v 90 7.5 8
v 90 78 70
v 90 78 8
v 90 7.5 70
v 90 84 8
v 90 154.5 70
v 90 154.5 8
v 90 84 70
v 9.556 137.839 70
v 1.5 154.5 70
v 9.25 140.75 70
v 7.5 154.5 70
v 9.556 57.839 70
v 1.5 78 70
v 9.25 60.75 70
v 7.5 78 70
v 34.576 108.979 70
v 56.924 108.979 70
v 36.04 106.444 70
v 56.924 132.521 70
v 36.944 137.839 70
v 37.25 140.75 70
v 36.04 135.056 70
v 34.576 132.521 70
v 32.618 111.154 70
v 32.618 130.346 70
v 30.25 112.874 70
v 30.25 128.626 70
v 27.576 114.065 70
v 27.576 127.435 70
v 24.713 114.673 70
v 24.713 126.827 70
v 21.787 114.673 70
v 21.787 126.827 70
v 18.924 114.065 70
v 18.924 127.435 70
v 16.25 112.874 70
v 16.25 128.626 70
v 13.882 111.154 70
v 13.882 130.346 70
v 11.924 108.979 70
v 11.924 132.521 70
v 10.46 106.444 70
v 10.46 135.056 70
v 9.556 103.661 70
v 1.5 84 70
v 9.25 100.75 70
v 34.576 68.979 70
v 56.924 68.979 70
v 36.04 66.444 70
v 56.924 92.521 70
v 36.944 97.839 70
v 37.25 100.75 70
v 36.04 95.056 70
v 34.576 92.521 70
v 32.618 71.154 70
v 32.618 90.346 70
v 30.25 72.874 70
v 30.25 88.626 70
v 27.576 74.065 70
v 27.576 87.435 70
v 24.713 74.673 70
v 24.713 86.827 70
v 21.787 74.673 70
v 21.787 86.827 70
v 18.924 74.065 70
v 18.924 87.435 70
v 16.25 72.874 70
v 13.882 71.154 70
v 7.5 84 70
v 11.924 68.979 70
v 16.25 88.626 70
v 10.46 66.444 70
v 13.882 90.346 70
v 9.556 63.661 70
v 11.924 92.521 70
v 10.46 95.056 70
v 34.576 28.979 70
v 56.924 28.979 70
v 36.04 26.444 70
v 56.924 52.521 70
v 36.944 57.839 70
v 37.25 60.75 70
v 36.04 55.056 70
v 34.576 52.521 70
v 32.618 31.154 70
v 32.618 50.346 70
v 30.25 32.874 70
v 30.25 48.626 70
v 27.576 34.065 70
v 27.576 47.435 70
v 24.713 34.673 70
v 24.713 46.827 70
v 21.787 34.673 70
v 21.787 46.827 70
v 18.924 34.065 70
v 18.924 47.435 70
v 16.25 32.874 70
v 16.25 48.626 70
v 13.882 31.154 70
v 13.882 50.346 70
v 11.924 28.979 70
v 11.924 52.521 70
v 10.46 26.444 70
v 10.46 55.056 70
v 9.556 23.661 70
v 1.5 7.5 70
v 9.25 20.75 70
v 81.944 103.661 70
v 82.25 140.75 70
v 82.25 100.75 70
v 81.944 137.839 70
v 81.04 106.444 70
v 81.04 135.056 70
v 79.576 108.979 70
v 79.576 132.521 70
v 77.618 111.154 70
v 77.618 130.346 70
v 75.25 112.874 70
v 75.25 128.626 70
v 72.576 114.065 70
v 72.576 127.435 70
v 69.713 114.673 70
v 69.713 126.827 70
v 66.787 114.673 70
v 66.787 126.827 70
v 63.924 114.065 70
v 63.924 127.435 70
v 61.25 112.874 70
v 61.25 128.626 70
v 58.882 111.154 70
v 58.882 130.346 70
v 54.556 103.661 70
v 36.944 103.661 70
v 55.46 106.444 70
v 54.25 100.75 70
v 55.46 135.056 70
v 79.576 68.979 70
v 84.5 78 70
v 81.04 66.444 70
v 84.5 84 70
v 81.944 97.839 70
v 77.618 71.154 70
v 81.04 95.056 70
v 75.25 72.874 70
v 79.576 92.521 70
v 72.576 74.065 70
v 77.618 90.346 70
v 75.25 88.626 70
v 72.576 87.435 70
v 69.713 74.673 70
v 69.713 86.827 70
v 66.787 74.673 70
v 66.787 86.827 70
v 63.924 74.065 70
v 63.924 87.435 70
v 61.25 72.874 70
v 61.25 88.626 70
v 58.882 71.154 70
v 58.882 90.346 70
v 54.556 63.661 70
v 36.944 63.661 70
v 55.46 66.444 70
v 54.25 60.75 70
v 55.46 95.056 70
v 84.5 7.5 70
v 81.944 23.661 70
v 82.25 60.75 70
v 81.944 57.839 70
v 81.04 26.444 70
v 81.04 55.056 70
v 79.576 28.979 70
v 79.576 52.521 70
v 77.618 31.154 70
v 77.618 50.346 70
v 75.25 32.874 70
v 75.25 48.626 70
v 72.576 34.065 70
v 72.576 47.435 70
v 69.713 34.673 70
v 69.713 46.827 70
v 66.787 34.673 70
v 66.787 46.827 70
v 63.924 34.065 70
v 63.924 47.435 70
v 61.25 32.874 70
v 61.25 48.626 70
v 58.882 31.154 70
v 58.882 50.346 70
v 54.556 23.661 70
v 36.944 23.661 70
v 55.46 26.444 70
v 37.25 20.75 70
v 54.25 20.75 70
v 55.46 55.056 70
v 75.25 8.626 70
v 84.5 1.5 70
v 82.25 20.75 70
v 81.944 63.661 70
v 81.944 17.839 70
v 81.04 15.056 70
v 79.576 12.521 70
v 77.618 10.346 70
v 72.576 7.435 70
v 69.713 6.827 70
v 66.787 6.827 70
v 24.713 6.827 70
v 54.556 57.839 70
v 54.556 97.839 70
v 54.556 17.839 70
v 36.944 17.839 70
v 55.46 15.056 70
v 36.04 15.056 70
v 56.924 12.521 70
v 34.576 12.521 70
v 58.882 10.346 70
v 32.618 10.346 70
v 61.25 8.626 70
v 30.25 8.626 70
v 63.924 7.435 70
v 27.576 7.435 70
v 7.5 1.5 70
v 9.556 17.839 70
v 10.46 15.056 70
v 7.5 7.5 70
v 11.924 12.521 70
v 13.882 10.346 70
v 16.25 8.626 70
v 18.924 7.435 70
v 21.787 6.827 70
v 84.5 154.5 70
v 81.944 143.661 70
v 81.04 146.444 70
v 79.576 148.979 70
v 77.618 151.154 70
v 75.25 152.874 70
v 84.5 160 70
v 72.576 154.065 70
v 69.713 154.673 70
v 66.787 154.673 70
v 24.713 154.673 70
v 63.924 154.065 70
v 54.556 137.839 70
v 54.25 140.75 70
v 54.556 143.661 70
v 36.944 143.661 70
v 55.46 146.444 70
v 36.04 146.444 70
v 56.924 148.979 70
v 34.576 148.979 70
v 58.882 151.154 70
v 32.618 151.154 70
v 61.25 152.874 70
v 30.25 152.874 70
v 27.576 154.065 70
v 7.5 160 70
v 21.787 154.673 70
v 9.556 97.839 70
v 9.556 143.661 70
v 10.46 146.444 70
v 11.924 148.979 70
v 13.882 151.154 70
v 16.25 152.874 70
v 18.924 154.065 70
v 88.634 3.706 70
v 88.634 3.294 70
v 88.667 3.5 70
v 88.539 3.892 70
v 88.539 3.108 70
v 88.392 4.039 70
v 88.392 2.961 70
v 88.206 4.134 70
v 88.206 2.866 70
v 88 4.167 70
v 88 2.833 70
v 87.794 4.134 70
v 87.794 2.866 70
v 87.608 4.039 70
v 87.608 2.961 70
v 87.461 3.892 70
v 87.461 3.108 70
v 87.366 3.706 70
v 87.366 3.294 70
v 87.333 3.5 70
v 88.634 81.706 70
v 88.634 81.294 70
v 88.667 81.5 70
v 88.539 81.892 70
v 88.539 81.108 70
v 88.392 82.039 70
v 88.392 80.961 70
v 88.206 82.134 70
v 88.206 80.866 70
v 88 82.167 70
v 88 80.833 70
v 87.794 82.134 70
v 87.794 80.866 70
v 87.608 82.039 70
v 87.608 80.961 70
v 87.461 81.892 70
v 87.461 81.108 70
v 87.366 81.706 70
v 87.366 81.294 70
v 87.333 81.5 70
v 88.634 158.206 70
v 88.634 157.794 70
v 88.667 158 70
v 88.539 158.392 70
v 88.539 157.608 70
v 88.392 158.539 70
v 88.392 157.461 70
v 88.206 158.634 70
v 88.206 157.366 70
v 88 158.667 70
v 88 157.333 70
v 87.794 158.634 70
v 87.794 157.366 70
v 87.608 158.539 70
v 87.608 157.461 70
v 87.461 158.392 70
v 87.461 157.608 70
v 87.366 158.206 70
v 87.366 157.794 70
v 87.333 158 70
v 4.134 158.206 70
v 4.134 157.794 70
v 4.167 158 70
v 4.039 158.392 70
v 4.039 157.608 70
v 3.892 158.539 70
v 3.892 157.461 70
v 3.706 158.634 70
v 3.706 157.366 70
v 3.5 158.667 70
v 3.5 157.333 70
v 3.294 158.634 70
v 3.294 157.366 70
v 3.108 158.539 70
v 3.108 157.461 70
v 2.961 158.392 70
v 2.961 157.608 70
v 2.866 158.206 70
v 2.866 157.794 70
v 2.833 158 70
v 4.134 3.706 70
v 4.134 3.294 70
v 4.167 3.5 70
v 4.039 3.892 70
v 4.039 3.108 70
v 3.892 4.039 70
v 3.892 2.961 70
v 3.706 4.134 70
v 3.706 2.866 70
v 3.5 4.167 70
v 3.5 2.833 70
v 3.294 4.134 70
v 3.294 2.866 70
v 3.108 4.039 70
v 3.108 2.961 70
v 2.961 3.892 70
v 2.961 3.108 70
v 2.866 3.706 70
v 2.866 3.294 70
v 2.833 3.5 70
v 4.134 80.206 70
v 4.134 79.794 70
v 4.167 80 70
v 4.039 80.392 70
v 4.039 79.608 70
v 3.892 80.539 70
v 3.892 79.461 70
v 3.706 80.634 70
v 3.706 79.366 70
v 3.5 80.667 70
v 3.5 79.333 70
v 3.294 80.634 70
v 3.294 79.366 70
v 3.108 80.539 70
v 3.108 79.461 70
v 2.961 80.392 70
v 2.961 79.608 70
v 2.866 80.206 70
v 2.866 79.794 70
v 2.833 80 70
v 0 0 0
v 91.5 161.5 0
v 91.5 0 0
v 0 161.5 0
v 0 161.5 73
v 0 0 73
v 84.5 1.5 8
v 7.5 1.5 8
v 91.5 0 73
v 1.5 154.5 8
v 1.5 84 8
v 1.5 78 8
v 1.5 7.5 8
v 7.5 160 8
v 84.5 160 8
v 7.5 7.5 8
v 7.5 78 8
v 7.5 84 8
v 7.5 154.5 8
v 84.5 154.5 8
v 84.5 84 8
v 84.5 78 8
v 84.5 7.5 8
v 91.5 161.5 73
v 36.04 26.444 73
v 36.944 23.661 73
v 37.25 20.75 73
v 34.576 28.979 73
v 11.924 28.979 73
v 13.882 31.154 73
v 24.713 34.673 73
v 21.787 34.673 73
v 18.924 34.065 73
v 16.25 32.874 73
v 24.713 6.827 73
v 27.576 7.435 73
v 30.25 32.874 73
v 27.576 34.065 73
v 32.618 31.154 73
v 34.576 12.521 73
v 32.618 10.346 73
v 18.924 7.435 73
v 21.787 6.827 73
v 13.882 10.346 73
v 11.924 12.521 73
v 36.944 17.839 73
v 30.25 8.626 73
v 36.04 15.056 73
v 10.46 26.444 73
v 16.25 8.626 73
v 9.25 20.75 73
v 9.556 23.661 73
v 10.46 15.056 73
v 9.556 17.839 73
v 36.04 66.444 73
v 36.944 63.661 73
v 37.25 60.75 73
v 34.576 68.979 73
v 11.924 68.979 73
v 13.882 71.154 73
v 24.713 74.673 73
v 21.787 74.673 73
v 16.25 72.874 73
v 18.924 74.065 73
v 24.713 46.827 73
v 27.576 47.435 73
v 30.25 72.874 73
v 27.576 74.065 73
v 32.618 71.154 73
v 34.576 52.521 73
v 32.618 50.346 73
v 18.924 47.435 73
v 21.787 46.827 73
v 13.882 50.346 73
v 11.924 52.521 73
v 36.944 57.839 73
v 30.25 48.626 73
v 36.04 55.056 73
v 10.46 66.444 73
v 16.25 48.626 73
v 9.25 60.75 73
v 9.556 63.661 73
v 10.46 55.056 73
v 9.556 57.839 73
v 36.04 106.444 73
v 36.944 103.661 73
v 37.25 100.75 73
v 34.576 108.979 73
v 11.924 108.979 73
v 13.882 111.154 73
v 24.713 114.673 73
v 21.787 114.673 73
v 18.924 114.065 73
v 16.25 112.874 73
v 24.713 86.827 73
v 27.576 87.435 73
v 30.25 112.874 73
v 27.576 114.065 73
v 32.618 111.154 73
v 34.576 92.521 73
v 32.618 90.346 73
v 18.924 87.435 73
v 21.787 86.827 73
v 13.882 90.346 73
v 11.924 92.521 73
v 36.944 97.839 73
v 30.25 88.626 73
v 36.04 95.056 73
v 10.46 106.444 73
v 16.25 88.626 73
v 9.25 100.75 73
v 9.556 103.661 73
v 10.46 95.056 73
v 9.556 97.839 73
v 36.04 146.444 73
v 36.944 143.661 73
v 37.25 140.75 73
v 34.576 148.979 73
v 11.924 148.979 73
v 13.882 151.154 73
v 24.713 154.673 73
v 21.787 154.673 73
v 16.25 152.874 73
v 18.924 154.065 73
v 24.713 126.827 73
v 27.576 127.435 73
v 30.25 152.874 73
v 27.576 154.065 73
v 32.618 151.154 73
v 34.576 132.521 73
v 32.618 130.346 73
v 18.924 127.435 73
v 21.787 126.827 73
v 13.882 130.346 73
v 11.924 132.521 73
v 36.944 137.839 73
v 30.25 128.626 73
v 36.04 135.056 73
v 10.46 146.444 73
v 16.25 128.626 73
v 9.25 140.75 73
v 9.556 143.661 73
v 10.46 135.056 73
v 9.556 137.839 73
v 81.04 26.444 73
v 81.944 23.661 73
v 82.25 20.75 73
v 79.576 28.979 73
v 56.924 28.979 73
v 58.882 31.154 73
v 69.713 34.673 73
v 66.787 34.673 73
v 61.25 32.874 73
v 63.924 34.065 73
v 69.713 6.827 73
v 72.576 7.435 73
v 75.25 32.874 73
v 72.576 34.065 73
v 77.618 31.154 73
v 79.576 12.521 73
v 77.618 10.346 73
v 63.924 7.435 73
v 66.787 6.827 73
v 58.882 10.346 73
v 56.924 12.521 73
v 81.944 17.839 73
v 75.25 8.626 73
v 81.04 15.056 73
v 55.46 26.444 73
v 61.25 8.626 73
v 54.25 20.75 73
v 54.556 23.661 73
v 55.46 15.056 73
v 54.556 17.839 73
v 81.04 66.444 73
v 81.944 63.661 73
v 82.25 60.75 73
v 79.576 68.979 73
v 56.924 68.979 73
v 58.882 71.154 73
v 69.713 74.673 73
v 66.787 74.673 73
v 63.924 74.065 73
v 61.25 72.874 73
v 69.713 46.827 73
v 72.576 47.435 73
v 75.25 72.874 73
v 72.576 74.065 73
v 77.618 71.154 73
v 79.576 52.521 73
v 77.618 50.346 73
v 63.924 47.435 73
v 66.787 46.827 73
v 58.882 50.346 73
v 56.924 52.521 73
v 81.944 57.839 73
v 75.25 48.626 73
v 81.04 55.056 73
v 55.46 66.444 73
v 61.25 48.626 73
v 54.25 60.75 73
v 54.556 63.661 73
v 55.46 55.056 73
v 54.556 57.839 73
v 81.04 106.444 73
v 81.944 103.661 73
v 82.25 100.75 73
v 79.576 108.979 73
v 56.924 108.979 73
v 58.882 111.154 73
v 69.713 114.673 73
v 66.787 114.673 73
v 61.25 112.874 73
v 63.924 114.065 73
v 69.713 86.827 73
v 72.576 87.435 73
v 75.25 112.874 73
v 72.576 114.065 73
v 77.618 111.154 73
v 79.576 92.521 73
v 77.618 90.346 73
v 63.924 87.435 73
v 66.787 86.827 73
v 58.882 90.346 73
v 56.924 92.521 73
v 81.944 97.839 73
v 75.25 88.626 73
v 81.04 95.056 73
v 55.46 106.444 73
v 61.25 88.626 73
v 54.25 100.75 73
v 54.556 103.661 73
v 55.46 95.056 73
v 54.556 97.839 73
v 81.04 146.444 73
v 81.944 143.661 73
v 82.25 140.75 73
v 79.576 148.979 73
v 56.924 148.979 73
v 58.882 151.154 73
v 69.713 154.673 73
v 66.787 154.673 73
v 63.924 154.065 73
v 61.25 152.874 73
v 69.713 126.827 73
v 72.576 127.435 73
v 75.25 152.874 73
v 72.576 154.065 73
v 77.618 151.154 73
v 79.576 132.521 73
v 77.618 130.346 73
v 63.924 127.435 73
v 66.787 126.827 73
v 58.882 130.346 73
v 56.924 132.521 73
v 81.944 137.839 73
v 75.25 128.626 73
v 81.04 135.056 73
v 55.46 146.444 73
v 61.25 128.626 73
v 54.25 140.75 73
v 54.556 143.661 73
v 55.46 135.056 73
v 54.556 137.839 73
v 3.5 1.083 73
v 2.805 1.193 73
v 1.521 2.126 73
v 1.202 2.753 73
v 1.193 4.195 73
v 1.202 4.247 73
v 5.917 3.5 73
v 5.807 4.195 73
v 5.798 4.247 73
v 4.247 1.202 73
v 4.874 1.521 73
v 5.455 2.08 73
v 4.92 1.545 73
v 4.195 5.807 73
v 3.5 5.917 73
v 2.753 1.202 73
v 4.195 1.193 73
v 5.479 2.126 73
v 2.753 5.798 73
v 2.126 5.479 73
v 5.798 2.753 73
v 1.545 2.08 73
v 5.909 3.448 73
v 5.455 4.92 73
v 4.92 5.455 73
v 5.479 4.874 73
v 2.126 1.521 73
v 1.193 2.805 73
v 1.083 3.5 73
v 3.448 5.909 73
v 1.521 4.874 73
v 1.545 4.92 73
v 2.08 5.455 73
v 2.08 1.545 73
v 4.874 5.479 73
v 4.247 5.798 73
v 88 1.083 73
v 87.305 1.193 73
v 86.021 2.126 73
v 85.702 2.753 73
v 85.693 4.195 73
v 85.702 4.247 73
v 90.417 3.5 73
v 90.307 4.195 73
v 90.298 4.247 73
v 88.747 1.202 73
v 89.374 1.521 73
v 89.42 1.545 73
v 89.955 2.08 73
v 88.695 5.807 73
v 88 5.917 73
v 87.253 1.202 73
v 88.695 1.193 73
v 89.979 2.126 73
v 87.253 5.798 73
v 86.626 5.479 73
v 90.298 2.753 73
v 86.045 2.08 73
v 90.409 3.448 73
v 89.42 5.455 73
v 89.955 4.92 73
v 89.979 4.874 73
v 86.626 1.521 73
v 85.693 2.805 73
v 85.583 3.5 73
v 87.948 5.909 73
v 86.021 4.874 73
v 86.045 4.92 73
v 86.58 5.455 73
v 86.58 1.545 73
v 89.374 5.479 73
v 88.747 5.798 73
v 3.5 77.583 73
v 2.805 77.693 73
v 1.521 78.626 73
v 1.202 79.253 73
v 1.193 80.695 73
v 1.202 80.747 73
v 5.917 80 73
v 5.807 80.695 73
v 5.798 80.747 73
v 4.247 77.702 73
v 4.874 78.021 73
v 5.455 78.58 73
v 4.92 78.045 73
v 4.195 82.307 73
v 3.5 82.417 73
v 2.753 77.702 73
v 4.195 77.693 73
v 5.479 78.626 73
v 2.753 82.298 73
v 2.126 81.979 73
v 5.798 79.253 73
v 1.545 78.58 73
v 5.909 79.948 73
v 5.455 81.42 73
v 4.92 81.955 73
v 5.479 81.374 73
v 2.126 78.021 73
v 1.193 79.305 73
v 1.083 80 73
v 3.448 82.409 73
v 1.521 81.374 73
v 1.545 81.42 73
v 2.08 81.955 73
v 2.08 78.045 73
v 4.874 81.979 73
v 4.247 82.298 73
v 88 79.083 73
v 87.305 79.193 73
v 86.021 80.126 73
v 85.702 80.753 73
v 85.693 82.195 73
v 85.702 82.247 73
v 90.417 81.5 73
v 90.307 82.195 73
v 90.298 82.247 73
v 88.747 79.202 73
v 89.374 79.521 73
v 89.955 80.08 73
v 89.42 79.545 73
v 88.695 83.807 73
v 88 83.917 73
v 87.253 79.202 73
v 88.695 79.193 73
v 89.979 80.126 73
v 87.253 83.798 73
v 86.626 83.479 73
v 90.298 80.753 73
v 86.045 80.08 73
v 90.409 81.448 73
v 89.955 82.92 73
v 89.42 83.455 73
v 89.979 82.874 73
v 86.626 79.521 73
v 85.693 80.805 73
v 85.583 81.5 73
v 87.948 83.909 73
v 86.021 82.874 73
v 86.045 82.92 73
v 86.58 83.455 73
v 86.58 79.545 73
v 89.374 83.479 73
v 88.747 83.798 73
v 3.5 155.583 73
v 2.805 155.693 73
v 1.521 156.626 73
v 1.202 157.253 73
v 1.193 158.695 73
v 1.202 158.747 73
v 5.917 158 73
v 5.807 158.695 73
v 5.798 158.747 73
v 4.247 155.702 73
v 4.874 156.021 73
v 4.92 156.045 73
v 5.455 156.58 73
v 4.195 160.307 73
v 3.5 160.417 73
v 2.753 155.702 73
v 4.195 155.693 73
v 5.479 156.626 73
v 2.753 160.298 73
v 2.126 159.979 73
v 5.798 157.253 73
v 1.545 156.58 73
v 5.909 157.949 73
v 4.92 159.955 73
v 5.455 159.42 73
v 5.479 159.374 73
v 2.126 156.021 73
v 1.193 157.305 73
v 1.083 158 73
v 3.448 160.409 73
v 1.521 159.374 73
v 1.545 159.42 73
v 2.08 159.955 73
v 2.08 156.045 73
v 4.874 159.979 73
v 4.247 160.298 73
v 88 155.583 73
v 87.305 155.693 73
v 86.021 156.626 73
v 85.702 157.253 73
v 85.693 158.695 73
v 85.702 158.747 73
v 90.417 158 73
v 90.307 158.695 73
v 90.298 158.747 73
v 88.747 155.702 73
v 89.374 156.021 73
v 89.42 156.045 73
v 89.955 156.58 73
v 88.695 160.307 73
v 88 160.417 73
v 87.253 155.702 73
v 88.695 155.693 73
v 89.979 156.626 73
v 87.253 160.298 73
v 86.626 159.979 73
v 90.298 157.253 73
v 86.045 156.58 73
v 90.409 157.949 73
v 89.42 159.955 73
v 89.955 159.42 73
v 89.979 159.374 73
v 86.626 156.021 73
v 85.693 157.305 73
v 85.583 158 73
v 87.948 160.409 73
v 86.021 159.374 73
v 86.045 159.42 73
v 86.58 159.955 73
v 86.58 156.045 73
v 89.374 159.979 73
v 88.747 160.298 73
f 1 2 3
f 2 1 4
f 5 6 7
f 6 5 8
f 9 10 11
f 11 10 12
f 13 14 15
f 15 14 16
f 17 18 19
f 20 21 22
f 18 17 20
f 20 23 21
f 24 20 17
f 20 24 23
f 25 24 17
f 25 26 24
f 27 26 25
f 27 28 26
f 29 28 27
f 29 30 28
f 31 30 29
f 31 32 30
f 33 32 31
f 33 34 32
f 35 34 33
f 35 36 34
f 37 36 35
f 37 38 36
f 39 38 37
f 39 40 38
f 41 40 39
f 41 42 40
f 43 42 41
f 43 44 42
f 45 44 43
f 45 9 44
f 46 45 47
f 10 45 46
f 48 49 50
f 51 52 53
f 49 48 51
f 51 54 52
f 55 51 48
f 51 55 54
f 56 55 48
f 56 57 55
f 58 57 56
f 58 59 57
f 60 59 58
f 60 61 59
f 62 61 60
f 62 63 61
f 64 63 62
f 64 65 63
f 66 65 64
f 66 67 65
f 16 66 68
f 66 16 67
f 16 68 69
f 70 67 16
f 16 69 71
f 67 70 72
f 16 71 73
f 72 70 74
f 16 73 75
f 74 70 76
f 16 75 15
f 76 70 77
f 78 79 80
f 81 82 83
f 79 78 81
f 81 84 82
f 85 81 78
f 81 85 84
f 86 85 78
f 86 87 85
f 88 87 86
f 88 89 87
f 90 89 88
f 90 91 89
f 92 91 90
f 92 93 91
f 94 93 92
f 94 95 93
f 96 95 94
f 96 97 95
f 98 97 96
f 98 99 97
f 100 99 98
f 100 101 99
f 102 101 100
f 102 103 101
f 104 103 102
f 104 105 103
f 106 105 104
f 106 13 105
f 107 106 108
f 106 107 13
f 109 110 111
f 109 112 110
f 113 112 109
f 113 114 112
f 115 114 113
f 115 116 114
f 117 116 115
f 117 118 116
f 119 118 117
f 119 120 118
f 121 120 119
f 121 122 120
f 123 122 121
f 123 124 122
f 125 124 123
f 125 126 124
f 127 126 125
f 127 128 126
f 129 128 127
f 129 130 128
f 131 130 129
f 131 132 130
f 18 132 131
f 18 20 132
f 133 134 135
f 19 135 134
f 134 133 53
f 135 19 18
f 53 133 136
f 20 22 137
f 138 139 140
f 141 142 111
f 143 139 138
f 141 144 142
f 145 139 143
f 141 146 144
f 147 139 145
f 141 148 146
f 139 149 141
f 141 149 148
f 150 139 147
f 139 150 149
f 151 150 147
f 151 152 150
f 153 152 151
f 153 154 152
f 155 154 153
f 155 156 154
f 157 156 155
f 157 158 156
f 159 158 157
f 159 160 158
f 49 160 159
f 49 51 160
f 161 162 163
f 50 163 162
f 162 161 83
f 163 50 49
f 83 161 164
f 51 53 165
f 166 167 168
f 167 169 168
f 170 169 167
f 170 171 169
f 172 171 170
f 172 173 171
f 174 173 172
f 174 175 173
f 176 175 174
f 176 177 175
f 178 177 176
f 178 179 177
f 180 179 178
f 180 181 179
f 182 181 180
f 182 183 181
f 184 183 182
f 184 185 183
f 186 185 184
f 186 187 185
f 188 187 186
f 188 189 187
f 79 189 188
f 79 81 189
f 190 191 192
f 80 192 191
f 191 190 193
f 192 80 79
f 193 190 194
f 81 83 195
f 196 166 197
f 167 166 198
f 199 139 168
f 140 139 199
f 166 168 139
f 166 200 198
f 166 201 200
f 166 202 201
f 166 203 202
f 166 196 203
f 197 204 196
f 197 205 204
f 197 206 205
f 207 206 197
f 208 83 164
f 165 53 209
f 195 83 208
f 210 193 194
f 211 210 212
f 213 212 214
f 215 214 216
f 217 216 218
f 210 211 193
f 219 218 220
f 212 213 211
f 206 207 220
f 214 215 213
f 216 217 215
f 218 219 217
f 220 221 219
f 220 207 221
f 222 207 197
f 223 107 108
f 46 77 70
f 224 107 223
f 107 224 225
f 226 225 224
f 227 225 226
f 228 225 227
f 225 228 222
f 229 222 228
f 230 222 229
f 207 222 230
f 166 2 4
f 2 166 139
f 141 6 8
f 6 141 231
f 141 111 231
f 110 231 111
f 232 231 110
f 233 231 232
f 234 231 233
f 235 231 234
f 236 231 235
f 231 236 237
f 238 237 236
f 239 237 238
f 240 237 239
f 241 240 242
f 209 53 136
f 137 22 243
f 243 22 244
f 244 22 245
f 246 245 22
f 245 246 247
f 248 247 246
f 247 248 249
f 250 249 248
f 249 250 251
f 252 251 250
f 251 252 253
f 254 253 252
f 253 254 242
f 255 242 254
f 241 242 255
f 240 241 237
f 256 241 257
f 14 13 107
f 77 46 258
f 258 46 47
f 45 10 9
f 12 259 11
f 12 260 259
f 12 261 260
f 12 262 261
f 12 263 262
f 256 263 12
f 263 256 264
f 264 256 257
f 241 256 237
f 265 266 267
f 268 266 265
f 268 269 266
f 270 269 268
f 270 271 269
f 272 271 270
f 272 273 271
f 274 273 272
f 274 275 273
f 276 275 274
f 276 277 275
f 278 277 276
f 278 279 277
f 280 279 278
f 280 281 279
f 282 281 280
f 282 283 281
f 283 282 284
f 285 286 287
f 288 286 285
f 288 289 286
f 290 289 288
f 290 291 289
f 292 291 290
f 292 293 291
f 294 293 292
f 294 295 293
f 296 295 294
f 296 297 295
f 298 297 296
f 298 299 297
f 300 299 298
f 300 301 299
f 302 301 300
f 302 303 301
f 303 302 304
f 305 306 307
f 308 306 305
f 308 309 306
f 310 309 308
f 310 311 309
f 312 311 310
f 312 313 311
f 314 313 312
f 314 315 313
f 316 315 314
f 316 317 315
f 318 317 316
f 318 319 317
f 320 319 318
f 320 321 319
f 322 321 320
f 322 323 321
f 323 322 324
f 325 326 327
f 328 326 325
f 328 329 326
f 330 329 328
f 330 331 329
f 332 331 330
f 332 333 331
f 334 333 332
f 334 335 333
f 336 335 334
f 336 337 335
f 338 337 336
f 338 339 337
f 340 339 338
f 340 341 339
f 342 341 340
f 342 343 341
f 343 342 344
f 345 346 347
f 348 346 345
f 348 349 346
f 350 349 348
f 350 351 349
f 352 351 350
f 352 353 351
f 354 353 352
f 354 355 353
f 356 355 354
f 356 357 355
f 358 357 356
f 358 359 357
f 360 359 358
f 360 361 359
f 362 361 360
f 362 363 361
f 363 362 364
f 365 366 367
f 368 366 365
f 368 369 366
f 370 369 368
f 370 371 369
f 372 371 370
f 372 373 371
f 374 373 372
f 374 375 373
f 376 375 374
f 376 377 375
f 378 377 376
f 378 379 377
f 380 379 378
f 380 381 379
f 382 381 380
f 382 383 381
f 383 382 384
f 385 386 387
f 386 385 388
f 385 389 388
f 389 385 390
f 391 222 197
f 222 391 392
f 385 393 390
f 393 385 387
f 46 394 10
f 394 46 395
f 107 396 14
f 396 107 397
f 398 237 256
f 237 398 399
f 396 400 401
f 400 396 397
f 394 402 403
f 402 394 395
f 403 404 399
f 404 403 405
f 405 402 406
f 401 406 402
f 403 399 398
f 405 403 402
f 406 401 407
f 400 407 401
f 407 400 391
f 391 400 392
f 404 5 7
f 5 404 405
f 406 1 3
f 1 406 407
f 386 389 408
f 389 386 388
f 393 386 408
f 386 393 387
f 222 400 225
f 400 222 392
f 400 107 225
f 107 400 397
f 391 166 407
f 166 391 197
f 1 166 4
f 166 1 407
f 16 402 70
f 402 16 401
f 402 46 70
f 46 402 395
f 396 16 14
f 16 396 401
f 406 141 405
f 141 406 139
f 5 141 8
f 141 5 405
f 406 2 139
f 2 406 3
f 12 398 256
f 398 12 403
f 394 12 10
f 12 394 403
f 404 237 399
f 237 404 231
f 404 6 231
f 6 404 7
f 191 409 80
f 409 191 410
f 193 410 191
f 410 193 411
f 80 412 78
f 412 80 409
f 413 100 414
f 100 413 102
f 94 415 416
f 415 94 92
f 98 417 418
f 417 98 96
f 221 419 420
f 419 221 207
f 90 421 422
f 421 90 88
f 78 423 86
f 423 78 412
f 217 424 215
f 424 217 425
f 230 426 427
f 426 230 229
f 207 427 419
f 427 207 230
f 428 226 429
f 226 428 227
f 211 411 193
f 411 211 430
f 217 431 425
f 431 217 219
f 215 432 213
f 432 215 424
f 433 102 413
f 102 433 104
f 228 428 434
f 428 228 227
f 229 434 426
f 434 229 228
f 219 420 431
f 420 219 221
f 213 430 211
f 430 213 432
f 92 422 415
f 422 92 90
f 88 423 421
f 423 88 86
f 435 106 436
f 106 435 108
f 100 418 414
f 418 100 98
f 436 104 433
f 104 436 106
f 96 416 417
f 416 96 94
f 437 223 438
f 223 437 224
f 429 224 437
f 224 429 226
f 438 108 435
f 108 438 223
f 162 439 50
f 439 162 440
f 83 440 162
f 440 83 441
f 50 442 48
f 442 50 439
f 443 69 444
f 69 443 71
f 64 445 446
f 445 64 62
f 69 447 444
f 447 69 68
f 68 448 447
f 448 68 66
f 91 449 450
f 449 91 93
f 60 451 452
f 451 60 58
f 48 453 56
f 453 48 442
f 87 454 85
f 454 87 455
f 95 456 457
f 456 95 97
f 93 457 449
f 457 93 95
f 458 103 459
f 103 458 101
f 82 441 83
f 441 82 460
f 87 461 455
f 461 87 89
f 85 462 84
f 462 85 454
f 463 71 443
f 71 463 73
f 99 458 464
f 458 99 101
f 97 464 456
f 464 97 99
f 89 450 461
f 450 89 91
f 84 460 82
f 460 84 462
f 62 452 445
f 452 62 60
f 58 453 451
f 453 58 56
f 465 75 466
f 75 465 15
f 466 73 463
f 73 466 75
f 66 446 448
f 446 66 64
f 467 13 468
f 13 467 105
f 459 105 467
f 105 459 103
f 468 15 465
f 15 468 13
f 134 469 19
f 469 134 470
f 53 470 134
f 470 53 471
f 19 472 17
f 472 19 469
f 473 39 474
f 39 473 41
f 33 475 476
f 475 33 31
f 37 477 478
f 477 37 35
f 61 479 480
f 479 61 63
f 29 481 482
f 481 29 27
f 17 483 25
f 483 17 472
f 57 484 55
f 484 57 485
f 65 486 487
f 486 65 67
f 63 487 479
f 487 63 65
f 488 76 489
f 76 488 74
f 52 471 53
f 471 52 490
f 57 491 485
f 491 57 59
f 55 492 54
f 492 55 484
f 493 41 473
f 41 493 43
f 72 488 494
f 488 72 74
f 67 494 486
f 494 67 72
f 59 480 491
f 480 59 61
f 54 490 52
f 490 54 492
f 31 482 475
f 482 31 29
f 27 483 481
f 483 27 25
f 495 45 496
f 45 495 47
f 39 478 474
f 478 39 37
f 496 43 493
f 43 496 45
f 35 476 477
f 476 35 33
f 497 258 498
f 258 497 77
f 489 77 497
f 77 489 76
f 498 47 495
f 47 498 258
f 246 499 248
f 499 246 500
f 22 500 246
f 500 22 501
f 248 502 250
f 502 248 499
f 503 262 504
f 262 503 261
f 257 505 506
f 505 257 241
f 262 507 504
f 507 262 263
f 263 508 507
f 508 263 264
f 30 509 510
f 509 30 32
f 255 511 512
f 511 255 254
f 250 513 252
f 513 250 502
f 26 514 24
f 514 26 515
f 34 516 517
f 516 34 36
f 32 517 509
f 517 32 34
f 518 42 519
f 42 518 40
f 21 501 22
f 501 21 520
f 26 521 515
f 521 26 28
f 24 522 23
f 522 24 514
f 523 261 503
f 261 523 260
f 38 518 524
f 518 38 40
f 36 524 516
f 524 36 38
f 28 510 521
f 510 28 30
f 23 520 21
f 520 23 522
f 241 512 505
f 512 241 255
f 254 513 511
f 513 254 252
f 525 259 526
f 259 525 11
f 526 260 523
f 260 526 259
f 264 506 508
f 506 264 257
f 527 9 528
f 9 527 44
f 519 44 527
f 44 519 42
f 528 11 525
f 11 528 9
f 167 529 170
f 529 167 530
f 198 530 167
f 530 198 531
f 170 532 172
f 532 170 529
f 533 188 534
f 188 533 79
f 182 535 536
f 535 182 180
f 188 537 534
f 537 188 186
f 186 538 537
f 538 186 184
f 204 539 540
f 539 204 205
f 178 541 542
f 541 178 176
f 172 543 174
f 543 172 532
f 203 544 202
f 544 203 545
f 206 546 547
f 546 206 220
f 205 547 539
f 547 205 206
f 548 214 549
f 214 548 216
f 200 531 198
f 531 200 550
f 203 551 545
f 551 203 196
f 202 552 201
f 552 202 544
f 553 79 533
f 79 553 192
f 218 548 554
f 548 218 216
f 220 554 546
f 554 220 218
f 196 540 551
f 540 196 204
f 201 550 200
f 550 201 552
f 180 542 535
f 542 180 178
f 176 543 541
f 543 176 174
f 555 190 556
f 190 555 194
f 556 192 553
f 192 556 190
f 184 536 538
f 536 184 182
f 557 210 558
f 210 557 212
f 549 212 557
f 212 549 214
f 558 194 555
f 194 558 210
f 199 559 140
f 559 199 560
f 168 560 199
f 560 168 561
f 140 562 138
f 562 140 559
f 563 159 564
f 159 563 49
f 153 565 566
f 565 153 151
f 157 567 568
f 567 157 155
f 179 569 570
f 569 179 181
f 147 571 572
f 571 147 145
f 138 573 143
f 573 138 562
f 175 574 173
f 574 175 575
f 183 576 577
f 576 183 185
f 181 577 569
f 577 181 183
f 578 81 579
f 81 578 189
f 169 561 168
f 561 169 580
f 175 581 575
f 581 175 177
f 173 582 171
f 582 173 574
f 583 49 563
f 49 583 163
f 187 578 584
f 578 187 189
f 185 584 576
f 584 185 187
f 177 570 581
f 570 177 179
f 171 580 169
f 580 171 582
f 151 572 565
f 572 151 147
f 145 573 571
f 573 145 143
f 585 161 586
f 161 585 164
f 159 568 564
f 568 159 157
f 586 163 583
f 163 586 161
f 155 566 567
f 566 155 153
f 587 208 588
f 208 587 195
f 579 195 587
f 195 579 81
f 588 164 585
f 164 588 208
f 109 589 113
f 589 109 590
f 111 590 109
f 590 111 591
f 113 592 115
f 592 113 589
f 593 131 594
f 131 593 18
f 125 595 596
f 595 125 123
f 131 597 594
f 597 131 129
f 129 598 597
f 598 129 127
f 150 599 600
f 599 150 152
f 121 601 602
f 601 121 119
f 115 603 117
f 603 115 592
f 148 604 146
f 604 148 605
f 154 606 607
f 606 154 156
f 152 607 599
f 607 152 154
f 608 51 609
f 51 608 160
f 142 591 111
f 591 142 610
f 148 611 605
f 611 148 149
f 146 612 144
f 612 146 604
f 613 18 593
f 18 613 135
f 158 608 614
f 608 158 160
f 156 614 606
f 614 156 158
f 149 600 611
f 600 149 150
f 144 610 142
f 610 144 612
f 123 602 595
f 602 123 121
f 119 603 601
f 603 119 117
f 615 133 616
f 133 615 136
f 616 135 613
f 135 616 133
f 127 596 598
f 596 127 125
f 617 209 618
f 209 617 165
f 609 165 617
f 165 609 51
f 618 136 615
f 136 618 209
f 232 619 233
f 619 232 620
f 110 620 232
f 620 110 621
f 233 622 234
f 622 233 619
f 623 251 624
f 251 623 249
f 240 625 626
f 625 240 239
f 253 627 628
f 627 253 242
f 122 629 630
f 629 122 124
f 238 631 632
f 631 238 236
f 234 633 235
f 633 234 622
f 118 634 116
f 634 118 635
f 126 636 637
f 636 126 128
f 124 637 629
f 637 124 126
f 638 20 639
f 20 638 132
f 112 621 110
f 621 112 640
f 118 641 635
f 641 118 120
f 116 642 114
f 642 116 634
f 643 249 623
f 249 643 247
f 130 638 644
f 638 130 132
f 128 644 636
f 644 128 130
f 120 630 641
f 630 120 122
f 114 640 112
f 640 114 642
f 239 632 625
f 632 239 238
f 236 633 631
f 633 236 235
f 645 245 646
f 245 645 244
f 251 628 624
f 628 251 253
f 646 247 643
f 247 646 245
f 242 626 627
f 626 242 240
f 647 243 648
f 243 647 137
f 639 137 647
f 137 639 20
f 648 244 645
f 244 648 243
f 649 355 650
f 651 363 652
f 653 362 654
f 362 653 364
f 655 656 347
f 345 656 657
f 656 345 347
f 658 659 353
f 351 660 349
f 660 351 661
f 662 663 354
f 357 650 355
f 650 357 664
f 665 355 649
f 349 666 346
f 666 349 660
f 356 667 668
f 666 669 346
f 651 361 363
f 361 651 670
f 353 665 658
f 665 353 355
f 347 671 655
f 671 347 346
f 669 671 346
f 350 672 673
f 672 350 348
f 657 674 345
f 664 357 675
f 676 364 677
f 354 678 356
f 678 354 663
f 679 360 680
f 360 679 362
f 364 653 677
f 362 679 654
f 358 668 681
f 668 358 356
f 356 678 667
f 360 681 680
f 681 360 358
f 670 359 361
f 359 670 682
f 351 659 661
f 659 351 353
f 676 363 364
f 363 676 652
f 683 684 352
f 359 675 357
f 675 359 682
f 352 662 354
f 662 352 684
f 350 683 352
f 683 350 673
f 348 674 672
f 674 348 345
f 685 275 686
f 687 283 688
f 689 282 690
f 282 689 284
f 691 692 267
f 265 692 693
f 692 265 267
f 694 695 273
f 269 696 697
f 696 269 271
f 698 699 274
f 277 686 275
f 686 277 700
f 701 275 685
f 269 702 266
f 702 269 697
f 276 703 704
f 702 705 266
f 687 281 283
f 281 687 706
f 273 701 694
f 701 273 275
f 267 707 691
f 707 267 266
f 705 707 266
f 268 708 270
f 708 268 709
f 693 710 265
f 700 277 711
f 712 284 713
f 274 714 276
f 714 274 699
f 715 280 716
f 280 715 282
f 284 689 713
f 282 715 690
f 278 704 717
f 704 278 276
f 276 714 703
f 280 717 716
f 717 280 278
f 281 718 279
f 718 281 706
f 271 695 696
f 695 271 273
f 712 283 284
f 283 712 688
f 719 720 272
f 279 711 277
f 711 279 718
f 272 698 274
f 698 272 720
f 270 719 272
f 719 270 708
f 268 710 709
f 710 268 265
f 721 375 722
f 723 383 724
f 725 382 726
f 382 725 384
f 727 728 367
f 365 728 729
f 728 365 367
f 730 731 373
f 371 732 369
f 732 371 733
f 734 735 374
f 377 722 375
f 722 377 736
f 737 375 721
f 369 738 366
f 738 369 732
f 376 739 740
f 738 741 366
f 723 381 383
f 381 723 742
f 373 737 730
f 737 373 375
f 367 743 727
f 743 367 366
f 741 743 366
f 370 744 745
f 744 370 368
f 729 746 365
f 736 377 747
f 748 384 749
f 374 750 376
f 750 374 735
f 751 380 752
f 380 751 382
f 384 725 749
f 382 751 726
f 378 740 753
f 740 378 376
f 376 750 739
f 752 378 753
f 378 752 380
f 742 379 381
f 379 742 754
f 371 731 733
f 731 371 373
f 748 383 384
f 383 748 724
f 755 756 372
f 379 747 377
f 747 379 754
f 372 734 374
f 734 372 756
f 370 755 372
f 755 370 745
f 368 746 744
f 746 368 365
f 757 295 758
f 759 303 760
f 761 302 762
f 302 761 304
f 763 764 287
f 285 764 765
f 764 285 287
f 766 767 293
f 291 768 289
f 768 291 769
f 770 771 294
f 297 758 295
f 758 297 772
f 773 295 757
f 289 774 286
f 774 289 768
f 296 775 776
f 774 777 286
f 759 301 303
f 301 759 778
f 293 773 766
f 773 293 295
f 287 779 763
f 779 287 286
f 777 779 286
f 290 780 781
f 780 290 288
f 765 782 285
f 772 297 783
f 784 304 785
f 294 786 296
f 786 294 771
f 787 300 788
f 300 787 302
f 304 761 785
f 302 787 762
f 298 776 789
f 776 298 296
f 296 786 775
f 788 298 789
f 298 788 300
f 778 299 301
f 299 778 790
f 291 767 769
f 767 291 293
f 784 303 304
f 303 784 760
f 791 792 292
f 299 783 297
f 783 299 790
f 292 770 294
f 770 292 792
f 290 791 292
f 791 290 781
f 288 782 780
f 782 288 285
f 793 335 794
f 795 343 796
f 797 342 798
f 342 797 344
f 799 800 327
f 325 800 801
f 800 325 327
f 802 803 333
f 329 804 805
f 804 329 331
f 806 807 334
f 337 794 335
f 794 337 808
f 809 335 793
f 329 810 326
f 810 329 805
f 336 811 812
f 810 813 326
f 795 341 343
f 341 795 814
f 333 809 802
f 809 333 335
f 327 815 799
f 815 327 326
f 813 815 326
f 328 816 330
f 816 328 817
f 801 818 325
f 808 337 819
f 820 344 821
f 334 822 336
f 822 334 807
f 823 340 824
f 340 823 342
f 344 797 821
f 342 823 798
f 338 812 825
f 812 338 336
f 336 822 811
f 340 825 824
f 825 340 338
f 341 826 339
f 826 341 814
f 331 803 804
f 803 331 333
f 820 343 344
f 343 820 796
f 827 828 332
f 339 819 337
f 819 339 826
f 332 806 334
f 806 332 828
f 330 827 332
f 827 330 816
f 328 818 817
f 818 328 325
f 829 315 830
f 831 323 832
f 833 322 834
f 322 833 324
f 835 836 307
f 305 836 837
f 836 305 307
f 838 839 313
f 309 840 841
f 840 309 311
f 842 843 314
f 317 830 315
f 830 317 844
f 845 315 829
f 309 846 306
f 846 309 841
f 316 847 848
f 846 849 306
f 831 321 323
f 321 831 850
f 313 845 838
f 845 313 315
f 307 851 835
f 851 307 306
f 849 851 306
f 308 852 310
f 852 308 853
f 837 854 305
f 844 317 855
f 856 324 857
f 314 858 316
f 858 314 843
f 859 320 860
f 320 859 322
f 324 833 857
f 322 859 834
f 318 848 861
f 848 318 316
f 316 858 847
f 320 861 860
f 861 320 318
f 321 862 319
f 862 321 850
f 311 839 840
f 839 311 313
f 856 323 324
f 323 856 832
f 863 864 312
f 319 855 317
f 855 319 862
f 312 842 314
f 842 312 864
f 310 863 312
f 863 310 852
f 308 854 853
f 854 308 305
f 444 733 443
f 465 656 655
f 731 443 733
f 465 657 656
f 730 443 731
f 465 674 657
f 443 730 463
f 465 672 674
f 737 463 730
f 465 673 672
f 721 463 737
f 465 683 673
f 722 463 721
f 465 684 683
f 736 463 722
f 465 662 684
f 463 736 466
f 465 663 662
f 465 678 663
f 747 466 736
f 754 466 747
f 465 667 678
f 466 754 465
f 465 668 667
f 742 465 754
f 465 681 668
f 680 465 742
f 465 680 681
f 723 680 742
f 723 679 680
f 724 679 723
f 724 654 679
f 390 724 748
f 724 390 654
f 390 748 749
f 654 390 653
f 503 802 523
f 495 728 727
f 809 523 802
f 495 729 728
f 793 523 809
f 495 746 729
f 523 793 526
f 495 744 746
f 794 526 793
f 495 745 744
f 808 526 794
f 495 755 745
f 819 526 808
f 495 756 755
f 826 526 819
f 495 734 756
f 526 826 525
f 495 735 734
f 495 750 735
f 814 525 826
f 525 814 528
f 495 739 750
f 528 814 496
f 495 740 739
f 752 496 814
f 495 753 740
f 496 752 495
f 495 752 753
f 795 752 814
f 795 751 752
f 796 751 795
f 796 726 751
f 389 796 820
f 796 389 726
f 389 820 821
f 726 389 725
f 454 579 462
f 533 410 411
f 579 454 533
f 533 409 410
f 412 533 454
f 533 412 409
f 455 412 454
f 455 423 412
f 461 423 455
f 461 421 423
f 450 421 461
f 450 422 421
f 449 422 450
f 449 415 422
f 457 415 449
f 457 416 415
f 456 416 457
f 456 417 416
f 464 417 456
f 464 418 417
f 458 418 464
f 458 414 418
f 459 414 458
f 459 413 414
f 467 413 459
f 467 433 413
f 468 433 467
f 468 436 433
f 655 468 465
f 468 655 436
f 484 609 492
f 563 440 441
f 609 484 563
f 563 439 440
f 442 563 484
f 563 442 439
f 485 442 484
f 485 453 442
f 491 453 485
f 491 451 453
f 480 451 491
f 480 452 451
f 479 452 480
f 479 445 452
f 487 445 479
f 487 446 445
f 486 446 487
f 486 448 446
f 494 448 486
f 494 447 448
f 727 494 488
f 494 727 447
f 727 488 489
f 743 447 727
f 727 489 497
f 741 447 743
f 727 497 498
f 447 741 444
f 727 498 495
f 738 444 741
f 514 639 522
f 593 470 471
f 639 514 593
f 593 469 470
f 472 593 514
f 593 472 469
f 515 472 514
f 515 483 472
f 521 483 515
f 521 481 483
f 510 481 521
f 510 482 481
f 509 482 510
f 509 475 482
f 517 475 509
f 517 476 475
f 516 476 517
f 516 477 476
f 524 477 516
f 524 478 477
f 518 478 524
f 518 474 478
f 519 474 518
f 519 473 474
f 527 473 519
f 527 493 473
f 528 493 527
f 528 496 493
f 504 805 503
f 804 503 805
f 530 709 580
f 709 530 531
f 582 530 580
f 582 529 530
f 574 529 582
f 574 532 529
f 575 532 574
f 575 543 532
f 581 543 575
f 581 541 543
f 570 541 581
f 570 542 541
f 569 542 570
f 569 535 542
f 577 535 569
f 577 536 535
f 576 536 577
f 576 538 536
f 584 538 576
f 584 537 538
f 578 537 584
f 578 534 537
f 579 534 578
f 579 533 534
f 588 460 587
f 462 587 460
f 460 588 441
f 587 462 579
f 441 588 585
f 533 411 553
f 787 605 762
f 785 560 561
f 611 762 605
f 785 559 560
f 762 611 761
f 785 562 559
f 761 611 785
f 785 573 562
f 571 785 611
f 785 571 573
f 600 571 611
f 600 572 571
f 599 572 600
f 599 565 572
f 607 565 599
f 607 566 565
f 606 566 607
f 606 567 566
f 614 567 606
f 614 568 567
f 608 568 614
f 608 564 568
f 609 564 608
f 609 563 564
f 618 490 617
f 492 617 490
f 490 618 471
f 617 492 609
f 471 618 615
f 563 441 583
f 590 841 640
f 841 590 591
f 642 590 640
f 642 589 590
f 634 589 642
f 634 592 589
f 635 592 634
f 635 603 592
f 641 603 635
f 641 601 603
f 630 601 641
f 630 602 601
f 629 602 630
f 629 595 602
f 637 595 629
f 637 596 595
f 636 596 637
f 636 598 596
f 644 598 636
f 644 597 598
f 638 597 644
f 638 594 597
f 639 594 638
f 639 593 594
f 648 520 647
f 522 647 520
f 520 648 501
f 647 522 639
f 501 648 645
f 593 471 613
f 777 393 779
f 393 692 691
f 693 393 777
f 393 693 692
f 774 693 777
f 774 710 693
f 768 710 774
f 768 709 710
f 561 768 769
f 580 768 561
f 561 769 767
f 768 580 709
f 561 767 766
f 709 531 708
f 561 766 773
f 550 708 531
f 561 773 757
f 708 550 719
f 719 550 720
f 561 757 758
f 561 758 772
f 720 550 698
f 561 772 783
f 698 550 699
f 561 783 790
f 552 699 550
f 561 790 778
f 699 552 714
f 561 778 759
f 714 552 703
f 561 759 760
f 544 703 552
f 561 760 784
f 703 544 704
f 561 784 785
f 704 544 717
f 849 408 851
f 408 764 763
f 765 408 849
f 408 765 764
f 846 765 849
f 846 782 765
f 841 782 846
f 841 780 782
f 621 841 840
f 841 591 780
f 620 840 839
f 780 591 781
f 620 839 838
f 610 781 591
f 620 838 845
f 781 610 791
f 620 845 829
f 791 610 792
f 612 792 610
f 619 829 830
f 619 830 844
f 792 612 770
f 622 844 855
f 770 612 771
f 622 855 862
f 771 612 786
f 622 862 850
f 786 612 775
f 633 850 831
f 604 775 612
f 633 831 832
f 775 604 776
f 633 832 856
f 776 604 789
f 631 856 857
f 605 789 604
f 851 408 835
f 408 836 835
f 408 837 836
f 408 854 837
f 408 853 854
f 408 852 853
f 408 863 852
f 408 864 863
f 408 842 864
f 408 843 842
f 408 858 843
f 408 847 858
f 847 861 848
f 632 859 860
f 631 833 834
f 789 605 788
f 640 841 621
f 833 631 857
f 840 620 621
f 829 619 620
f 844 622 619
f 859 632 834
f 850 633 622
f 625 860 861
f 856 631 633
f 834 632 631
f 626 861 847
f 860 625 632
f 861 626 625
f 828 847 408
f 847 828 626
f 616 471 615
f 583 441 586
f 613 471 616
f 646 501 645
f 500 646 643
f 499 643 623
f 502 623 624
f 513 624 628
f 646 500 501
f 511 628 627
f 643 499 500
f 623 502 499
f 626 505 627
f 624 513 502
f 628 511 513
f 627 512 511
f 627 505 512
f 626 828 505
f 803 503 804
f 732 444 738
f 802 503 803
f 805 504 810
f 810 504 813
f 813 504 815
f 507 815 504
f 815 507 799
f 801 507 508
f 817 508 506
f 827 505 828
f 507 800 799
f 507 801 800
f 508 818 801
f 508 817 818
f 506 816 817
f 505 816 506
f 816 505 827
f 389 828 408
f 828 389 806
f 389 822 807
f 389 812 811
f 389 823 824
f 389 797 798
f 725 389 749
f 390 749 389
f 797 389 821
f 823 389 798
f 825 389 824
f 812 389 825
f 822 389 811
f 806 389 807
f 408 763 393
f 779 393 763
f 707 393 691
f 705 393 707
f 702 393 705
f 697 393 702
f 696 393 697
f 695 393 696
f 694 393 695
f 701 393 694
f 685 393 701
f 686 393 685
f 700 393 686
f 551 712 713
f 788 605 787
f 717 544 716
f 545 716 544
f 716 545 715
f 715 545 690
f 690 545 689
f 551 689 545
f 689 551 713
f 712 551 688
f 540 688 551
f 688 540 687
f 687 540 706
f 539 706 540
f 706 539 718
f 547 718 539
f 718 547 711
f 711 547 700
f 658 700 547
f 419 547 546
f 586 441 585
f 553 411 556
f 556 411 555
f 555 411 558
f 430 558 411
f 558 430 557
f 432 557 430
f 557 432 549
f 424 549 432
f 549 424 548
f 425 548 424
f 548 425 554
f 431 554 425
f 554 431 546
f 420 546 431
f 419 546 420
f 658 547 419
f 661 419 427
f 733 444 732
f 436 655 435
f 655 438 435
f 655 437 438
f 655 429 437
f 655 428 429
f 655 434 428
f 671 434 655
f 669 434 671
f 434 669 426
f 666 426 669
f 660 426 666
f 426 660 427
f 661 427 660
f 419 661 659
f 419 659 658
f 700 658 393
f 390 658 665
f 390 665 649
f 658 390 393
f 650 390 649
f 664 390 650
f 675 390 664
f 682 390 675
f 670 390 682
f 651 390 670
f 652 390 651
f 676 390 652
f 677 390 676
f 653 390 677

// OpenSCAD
Render = "entire"; // [body:Case,lid:Lid,entire:Entire]

screw_cones = true; // [true:Yes,false:No]
wall_thickness=1.5;
pillar_thickness_factor=4;
lid_thickness=3;
floor_thickness=8;
wall_height=70;
wall_width=90;
wall_length=160;
button_diameter=28; // [28:M28,24:M24]
buttons_per_row=4;
button_rows=2;

buttonSpace=wall_length/buttons_per_row;

module case() {
    translate([0,0,0])
        cube([wall_width,wall_thickness,wall_height]);
        cube([wall_thickness,wall_length,wall_height]);
        cube([wall_width,wall_length,floor_thickness]); // floor

    translate([0,wall_length,0])
        cube([wall_width,wall_thickness,wall_height]);

    translate([wall_width,0,0])
        cube([wall_thickness,wall_length+wall_thickness,wall_height]);

    // Pillars
        translate([wall_thickness,wall_thickness,0])
            cube([wall_thickness*pillar_thickness_factor,wall_thickness*pillar_thickness_factor,wall_height]);
        translate([wall_width-pillar_thickness_factor-wall_thickness,wall_thickness,0])
            cube([wall_thickness*pillar_thickness_factor,wall_thickness*pillar_thickness_factor,wall_height]);
        translate([wall_thickness,wall_length/2-pillar_thickness_factor/2,0])
            cube([wall_thickness*pillar_thickness_factor,wall_thickness*pillar_thickness_factor,wall_height]);
        translate([wall_width-pillar_thickness_factor-wall_thickness,wall_length/2-pillar_thickness_factor/2,0])
            cube([wall_thickness*pillar_thickness_factor,wall_thickness*pillar_thickness_factor,wall_height]);
        translate([wall_thickness,wall_length-pillar_thickness_factor-wall_thickness,0])
            cube([wall_thickness*pillar_thickness_factor,wall_thickness*pillar_thickness_factor,wall_height]);
        translate([wall_width-pillar_thickness_factor-wall_thickness,wall_length-pillar_thickness_factor-wall_thickness,0])
            cube([wall_thickness*pillar_thickness_factor,wall_thickness*pillar_thickness_factor,wall_height]);


};

module lid() {
    difference() {
        translate([0,0,wall_height]) cube([wall_width+wall_thickness,wall_length+wall_thickness,lid_thickness]); // lid
        for ( r = [1:2:3] ) {        
            for ( h = [0:buttons_per_row-1] ) {
               translate ([wall_width/4*r+wall_thickness/2,buttonSpace*h+wall_thickness/2+buttonSpace/2,wall_height]) cylinder(lid_thickness*2, button_diameter/2,button_diameter/2);
            };
        };
        // Screw cones
        if (screw_cones) {
            translate([wall_thickness+pillar_thickness_factor/2,wall_thickness+pillar_thickness_factor/2,wall_height])
                cylinder($fn=20,pillar_thickness_factor,pillar_thickness_factor/6,lid_thickness);
            translate([wall_width-pillar_thickness_factor+pillar_thickness_factor/2,wall_thickness+pillar_thickness_factor/2,wall_height])
                cylinder($fn=20,pillar_thickness_factor,pillar_thickness_factor/6,lid_thickness);
            translate([wall_thickness+pillar_thickness_factor/2,wall_length/2,wall_height])
                cylinder($fn=20,pillar_thickness_factor,pillar_thickness_factor/6,lid_thickness);
            translate([wall_width-pillar_thickness_factor/2,wall_length/2+wall_thickness,wall_height])
                cylinder($fn=20,pillar_thickness_factor,pillar_thickness_factor/6,lid_thickness);
            translate([wall_thickness+pillar_thickness_factor/2,wall_length-pillar_thickness_factor/2,wall_height])
                cylinder($fn=20,pillar_thickness_factor,pillar_thickness_factor/6,lid_thickness);
            translate([wall_width-pillar_thickness_factor/2,wall_length-pillar_thickness_factor/2,wall_height])
                cylinder($fn=20,pillar_thickness_factor,pillar_thickness_factor/6,lid_thickness);
        };
    };
};
 
if ((Render=="body") || (Render=="entire"))  case();
if ((Render=="lid") || (Render=="entire")) lid();
